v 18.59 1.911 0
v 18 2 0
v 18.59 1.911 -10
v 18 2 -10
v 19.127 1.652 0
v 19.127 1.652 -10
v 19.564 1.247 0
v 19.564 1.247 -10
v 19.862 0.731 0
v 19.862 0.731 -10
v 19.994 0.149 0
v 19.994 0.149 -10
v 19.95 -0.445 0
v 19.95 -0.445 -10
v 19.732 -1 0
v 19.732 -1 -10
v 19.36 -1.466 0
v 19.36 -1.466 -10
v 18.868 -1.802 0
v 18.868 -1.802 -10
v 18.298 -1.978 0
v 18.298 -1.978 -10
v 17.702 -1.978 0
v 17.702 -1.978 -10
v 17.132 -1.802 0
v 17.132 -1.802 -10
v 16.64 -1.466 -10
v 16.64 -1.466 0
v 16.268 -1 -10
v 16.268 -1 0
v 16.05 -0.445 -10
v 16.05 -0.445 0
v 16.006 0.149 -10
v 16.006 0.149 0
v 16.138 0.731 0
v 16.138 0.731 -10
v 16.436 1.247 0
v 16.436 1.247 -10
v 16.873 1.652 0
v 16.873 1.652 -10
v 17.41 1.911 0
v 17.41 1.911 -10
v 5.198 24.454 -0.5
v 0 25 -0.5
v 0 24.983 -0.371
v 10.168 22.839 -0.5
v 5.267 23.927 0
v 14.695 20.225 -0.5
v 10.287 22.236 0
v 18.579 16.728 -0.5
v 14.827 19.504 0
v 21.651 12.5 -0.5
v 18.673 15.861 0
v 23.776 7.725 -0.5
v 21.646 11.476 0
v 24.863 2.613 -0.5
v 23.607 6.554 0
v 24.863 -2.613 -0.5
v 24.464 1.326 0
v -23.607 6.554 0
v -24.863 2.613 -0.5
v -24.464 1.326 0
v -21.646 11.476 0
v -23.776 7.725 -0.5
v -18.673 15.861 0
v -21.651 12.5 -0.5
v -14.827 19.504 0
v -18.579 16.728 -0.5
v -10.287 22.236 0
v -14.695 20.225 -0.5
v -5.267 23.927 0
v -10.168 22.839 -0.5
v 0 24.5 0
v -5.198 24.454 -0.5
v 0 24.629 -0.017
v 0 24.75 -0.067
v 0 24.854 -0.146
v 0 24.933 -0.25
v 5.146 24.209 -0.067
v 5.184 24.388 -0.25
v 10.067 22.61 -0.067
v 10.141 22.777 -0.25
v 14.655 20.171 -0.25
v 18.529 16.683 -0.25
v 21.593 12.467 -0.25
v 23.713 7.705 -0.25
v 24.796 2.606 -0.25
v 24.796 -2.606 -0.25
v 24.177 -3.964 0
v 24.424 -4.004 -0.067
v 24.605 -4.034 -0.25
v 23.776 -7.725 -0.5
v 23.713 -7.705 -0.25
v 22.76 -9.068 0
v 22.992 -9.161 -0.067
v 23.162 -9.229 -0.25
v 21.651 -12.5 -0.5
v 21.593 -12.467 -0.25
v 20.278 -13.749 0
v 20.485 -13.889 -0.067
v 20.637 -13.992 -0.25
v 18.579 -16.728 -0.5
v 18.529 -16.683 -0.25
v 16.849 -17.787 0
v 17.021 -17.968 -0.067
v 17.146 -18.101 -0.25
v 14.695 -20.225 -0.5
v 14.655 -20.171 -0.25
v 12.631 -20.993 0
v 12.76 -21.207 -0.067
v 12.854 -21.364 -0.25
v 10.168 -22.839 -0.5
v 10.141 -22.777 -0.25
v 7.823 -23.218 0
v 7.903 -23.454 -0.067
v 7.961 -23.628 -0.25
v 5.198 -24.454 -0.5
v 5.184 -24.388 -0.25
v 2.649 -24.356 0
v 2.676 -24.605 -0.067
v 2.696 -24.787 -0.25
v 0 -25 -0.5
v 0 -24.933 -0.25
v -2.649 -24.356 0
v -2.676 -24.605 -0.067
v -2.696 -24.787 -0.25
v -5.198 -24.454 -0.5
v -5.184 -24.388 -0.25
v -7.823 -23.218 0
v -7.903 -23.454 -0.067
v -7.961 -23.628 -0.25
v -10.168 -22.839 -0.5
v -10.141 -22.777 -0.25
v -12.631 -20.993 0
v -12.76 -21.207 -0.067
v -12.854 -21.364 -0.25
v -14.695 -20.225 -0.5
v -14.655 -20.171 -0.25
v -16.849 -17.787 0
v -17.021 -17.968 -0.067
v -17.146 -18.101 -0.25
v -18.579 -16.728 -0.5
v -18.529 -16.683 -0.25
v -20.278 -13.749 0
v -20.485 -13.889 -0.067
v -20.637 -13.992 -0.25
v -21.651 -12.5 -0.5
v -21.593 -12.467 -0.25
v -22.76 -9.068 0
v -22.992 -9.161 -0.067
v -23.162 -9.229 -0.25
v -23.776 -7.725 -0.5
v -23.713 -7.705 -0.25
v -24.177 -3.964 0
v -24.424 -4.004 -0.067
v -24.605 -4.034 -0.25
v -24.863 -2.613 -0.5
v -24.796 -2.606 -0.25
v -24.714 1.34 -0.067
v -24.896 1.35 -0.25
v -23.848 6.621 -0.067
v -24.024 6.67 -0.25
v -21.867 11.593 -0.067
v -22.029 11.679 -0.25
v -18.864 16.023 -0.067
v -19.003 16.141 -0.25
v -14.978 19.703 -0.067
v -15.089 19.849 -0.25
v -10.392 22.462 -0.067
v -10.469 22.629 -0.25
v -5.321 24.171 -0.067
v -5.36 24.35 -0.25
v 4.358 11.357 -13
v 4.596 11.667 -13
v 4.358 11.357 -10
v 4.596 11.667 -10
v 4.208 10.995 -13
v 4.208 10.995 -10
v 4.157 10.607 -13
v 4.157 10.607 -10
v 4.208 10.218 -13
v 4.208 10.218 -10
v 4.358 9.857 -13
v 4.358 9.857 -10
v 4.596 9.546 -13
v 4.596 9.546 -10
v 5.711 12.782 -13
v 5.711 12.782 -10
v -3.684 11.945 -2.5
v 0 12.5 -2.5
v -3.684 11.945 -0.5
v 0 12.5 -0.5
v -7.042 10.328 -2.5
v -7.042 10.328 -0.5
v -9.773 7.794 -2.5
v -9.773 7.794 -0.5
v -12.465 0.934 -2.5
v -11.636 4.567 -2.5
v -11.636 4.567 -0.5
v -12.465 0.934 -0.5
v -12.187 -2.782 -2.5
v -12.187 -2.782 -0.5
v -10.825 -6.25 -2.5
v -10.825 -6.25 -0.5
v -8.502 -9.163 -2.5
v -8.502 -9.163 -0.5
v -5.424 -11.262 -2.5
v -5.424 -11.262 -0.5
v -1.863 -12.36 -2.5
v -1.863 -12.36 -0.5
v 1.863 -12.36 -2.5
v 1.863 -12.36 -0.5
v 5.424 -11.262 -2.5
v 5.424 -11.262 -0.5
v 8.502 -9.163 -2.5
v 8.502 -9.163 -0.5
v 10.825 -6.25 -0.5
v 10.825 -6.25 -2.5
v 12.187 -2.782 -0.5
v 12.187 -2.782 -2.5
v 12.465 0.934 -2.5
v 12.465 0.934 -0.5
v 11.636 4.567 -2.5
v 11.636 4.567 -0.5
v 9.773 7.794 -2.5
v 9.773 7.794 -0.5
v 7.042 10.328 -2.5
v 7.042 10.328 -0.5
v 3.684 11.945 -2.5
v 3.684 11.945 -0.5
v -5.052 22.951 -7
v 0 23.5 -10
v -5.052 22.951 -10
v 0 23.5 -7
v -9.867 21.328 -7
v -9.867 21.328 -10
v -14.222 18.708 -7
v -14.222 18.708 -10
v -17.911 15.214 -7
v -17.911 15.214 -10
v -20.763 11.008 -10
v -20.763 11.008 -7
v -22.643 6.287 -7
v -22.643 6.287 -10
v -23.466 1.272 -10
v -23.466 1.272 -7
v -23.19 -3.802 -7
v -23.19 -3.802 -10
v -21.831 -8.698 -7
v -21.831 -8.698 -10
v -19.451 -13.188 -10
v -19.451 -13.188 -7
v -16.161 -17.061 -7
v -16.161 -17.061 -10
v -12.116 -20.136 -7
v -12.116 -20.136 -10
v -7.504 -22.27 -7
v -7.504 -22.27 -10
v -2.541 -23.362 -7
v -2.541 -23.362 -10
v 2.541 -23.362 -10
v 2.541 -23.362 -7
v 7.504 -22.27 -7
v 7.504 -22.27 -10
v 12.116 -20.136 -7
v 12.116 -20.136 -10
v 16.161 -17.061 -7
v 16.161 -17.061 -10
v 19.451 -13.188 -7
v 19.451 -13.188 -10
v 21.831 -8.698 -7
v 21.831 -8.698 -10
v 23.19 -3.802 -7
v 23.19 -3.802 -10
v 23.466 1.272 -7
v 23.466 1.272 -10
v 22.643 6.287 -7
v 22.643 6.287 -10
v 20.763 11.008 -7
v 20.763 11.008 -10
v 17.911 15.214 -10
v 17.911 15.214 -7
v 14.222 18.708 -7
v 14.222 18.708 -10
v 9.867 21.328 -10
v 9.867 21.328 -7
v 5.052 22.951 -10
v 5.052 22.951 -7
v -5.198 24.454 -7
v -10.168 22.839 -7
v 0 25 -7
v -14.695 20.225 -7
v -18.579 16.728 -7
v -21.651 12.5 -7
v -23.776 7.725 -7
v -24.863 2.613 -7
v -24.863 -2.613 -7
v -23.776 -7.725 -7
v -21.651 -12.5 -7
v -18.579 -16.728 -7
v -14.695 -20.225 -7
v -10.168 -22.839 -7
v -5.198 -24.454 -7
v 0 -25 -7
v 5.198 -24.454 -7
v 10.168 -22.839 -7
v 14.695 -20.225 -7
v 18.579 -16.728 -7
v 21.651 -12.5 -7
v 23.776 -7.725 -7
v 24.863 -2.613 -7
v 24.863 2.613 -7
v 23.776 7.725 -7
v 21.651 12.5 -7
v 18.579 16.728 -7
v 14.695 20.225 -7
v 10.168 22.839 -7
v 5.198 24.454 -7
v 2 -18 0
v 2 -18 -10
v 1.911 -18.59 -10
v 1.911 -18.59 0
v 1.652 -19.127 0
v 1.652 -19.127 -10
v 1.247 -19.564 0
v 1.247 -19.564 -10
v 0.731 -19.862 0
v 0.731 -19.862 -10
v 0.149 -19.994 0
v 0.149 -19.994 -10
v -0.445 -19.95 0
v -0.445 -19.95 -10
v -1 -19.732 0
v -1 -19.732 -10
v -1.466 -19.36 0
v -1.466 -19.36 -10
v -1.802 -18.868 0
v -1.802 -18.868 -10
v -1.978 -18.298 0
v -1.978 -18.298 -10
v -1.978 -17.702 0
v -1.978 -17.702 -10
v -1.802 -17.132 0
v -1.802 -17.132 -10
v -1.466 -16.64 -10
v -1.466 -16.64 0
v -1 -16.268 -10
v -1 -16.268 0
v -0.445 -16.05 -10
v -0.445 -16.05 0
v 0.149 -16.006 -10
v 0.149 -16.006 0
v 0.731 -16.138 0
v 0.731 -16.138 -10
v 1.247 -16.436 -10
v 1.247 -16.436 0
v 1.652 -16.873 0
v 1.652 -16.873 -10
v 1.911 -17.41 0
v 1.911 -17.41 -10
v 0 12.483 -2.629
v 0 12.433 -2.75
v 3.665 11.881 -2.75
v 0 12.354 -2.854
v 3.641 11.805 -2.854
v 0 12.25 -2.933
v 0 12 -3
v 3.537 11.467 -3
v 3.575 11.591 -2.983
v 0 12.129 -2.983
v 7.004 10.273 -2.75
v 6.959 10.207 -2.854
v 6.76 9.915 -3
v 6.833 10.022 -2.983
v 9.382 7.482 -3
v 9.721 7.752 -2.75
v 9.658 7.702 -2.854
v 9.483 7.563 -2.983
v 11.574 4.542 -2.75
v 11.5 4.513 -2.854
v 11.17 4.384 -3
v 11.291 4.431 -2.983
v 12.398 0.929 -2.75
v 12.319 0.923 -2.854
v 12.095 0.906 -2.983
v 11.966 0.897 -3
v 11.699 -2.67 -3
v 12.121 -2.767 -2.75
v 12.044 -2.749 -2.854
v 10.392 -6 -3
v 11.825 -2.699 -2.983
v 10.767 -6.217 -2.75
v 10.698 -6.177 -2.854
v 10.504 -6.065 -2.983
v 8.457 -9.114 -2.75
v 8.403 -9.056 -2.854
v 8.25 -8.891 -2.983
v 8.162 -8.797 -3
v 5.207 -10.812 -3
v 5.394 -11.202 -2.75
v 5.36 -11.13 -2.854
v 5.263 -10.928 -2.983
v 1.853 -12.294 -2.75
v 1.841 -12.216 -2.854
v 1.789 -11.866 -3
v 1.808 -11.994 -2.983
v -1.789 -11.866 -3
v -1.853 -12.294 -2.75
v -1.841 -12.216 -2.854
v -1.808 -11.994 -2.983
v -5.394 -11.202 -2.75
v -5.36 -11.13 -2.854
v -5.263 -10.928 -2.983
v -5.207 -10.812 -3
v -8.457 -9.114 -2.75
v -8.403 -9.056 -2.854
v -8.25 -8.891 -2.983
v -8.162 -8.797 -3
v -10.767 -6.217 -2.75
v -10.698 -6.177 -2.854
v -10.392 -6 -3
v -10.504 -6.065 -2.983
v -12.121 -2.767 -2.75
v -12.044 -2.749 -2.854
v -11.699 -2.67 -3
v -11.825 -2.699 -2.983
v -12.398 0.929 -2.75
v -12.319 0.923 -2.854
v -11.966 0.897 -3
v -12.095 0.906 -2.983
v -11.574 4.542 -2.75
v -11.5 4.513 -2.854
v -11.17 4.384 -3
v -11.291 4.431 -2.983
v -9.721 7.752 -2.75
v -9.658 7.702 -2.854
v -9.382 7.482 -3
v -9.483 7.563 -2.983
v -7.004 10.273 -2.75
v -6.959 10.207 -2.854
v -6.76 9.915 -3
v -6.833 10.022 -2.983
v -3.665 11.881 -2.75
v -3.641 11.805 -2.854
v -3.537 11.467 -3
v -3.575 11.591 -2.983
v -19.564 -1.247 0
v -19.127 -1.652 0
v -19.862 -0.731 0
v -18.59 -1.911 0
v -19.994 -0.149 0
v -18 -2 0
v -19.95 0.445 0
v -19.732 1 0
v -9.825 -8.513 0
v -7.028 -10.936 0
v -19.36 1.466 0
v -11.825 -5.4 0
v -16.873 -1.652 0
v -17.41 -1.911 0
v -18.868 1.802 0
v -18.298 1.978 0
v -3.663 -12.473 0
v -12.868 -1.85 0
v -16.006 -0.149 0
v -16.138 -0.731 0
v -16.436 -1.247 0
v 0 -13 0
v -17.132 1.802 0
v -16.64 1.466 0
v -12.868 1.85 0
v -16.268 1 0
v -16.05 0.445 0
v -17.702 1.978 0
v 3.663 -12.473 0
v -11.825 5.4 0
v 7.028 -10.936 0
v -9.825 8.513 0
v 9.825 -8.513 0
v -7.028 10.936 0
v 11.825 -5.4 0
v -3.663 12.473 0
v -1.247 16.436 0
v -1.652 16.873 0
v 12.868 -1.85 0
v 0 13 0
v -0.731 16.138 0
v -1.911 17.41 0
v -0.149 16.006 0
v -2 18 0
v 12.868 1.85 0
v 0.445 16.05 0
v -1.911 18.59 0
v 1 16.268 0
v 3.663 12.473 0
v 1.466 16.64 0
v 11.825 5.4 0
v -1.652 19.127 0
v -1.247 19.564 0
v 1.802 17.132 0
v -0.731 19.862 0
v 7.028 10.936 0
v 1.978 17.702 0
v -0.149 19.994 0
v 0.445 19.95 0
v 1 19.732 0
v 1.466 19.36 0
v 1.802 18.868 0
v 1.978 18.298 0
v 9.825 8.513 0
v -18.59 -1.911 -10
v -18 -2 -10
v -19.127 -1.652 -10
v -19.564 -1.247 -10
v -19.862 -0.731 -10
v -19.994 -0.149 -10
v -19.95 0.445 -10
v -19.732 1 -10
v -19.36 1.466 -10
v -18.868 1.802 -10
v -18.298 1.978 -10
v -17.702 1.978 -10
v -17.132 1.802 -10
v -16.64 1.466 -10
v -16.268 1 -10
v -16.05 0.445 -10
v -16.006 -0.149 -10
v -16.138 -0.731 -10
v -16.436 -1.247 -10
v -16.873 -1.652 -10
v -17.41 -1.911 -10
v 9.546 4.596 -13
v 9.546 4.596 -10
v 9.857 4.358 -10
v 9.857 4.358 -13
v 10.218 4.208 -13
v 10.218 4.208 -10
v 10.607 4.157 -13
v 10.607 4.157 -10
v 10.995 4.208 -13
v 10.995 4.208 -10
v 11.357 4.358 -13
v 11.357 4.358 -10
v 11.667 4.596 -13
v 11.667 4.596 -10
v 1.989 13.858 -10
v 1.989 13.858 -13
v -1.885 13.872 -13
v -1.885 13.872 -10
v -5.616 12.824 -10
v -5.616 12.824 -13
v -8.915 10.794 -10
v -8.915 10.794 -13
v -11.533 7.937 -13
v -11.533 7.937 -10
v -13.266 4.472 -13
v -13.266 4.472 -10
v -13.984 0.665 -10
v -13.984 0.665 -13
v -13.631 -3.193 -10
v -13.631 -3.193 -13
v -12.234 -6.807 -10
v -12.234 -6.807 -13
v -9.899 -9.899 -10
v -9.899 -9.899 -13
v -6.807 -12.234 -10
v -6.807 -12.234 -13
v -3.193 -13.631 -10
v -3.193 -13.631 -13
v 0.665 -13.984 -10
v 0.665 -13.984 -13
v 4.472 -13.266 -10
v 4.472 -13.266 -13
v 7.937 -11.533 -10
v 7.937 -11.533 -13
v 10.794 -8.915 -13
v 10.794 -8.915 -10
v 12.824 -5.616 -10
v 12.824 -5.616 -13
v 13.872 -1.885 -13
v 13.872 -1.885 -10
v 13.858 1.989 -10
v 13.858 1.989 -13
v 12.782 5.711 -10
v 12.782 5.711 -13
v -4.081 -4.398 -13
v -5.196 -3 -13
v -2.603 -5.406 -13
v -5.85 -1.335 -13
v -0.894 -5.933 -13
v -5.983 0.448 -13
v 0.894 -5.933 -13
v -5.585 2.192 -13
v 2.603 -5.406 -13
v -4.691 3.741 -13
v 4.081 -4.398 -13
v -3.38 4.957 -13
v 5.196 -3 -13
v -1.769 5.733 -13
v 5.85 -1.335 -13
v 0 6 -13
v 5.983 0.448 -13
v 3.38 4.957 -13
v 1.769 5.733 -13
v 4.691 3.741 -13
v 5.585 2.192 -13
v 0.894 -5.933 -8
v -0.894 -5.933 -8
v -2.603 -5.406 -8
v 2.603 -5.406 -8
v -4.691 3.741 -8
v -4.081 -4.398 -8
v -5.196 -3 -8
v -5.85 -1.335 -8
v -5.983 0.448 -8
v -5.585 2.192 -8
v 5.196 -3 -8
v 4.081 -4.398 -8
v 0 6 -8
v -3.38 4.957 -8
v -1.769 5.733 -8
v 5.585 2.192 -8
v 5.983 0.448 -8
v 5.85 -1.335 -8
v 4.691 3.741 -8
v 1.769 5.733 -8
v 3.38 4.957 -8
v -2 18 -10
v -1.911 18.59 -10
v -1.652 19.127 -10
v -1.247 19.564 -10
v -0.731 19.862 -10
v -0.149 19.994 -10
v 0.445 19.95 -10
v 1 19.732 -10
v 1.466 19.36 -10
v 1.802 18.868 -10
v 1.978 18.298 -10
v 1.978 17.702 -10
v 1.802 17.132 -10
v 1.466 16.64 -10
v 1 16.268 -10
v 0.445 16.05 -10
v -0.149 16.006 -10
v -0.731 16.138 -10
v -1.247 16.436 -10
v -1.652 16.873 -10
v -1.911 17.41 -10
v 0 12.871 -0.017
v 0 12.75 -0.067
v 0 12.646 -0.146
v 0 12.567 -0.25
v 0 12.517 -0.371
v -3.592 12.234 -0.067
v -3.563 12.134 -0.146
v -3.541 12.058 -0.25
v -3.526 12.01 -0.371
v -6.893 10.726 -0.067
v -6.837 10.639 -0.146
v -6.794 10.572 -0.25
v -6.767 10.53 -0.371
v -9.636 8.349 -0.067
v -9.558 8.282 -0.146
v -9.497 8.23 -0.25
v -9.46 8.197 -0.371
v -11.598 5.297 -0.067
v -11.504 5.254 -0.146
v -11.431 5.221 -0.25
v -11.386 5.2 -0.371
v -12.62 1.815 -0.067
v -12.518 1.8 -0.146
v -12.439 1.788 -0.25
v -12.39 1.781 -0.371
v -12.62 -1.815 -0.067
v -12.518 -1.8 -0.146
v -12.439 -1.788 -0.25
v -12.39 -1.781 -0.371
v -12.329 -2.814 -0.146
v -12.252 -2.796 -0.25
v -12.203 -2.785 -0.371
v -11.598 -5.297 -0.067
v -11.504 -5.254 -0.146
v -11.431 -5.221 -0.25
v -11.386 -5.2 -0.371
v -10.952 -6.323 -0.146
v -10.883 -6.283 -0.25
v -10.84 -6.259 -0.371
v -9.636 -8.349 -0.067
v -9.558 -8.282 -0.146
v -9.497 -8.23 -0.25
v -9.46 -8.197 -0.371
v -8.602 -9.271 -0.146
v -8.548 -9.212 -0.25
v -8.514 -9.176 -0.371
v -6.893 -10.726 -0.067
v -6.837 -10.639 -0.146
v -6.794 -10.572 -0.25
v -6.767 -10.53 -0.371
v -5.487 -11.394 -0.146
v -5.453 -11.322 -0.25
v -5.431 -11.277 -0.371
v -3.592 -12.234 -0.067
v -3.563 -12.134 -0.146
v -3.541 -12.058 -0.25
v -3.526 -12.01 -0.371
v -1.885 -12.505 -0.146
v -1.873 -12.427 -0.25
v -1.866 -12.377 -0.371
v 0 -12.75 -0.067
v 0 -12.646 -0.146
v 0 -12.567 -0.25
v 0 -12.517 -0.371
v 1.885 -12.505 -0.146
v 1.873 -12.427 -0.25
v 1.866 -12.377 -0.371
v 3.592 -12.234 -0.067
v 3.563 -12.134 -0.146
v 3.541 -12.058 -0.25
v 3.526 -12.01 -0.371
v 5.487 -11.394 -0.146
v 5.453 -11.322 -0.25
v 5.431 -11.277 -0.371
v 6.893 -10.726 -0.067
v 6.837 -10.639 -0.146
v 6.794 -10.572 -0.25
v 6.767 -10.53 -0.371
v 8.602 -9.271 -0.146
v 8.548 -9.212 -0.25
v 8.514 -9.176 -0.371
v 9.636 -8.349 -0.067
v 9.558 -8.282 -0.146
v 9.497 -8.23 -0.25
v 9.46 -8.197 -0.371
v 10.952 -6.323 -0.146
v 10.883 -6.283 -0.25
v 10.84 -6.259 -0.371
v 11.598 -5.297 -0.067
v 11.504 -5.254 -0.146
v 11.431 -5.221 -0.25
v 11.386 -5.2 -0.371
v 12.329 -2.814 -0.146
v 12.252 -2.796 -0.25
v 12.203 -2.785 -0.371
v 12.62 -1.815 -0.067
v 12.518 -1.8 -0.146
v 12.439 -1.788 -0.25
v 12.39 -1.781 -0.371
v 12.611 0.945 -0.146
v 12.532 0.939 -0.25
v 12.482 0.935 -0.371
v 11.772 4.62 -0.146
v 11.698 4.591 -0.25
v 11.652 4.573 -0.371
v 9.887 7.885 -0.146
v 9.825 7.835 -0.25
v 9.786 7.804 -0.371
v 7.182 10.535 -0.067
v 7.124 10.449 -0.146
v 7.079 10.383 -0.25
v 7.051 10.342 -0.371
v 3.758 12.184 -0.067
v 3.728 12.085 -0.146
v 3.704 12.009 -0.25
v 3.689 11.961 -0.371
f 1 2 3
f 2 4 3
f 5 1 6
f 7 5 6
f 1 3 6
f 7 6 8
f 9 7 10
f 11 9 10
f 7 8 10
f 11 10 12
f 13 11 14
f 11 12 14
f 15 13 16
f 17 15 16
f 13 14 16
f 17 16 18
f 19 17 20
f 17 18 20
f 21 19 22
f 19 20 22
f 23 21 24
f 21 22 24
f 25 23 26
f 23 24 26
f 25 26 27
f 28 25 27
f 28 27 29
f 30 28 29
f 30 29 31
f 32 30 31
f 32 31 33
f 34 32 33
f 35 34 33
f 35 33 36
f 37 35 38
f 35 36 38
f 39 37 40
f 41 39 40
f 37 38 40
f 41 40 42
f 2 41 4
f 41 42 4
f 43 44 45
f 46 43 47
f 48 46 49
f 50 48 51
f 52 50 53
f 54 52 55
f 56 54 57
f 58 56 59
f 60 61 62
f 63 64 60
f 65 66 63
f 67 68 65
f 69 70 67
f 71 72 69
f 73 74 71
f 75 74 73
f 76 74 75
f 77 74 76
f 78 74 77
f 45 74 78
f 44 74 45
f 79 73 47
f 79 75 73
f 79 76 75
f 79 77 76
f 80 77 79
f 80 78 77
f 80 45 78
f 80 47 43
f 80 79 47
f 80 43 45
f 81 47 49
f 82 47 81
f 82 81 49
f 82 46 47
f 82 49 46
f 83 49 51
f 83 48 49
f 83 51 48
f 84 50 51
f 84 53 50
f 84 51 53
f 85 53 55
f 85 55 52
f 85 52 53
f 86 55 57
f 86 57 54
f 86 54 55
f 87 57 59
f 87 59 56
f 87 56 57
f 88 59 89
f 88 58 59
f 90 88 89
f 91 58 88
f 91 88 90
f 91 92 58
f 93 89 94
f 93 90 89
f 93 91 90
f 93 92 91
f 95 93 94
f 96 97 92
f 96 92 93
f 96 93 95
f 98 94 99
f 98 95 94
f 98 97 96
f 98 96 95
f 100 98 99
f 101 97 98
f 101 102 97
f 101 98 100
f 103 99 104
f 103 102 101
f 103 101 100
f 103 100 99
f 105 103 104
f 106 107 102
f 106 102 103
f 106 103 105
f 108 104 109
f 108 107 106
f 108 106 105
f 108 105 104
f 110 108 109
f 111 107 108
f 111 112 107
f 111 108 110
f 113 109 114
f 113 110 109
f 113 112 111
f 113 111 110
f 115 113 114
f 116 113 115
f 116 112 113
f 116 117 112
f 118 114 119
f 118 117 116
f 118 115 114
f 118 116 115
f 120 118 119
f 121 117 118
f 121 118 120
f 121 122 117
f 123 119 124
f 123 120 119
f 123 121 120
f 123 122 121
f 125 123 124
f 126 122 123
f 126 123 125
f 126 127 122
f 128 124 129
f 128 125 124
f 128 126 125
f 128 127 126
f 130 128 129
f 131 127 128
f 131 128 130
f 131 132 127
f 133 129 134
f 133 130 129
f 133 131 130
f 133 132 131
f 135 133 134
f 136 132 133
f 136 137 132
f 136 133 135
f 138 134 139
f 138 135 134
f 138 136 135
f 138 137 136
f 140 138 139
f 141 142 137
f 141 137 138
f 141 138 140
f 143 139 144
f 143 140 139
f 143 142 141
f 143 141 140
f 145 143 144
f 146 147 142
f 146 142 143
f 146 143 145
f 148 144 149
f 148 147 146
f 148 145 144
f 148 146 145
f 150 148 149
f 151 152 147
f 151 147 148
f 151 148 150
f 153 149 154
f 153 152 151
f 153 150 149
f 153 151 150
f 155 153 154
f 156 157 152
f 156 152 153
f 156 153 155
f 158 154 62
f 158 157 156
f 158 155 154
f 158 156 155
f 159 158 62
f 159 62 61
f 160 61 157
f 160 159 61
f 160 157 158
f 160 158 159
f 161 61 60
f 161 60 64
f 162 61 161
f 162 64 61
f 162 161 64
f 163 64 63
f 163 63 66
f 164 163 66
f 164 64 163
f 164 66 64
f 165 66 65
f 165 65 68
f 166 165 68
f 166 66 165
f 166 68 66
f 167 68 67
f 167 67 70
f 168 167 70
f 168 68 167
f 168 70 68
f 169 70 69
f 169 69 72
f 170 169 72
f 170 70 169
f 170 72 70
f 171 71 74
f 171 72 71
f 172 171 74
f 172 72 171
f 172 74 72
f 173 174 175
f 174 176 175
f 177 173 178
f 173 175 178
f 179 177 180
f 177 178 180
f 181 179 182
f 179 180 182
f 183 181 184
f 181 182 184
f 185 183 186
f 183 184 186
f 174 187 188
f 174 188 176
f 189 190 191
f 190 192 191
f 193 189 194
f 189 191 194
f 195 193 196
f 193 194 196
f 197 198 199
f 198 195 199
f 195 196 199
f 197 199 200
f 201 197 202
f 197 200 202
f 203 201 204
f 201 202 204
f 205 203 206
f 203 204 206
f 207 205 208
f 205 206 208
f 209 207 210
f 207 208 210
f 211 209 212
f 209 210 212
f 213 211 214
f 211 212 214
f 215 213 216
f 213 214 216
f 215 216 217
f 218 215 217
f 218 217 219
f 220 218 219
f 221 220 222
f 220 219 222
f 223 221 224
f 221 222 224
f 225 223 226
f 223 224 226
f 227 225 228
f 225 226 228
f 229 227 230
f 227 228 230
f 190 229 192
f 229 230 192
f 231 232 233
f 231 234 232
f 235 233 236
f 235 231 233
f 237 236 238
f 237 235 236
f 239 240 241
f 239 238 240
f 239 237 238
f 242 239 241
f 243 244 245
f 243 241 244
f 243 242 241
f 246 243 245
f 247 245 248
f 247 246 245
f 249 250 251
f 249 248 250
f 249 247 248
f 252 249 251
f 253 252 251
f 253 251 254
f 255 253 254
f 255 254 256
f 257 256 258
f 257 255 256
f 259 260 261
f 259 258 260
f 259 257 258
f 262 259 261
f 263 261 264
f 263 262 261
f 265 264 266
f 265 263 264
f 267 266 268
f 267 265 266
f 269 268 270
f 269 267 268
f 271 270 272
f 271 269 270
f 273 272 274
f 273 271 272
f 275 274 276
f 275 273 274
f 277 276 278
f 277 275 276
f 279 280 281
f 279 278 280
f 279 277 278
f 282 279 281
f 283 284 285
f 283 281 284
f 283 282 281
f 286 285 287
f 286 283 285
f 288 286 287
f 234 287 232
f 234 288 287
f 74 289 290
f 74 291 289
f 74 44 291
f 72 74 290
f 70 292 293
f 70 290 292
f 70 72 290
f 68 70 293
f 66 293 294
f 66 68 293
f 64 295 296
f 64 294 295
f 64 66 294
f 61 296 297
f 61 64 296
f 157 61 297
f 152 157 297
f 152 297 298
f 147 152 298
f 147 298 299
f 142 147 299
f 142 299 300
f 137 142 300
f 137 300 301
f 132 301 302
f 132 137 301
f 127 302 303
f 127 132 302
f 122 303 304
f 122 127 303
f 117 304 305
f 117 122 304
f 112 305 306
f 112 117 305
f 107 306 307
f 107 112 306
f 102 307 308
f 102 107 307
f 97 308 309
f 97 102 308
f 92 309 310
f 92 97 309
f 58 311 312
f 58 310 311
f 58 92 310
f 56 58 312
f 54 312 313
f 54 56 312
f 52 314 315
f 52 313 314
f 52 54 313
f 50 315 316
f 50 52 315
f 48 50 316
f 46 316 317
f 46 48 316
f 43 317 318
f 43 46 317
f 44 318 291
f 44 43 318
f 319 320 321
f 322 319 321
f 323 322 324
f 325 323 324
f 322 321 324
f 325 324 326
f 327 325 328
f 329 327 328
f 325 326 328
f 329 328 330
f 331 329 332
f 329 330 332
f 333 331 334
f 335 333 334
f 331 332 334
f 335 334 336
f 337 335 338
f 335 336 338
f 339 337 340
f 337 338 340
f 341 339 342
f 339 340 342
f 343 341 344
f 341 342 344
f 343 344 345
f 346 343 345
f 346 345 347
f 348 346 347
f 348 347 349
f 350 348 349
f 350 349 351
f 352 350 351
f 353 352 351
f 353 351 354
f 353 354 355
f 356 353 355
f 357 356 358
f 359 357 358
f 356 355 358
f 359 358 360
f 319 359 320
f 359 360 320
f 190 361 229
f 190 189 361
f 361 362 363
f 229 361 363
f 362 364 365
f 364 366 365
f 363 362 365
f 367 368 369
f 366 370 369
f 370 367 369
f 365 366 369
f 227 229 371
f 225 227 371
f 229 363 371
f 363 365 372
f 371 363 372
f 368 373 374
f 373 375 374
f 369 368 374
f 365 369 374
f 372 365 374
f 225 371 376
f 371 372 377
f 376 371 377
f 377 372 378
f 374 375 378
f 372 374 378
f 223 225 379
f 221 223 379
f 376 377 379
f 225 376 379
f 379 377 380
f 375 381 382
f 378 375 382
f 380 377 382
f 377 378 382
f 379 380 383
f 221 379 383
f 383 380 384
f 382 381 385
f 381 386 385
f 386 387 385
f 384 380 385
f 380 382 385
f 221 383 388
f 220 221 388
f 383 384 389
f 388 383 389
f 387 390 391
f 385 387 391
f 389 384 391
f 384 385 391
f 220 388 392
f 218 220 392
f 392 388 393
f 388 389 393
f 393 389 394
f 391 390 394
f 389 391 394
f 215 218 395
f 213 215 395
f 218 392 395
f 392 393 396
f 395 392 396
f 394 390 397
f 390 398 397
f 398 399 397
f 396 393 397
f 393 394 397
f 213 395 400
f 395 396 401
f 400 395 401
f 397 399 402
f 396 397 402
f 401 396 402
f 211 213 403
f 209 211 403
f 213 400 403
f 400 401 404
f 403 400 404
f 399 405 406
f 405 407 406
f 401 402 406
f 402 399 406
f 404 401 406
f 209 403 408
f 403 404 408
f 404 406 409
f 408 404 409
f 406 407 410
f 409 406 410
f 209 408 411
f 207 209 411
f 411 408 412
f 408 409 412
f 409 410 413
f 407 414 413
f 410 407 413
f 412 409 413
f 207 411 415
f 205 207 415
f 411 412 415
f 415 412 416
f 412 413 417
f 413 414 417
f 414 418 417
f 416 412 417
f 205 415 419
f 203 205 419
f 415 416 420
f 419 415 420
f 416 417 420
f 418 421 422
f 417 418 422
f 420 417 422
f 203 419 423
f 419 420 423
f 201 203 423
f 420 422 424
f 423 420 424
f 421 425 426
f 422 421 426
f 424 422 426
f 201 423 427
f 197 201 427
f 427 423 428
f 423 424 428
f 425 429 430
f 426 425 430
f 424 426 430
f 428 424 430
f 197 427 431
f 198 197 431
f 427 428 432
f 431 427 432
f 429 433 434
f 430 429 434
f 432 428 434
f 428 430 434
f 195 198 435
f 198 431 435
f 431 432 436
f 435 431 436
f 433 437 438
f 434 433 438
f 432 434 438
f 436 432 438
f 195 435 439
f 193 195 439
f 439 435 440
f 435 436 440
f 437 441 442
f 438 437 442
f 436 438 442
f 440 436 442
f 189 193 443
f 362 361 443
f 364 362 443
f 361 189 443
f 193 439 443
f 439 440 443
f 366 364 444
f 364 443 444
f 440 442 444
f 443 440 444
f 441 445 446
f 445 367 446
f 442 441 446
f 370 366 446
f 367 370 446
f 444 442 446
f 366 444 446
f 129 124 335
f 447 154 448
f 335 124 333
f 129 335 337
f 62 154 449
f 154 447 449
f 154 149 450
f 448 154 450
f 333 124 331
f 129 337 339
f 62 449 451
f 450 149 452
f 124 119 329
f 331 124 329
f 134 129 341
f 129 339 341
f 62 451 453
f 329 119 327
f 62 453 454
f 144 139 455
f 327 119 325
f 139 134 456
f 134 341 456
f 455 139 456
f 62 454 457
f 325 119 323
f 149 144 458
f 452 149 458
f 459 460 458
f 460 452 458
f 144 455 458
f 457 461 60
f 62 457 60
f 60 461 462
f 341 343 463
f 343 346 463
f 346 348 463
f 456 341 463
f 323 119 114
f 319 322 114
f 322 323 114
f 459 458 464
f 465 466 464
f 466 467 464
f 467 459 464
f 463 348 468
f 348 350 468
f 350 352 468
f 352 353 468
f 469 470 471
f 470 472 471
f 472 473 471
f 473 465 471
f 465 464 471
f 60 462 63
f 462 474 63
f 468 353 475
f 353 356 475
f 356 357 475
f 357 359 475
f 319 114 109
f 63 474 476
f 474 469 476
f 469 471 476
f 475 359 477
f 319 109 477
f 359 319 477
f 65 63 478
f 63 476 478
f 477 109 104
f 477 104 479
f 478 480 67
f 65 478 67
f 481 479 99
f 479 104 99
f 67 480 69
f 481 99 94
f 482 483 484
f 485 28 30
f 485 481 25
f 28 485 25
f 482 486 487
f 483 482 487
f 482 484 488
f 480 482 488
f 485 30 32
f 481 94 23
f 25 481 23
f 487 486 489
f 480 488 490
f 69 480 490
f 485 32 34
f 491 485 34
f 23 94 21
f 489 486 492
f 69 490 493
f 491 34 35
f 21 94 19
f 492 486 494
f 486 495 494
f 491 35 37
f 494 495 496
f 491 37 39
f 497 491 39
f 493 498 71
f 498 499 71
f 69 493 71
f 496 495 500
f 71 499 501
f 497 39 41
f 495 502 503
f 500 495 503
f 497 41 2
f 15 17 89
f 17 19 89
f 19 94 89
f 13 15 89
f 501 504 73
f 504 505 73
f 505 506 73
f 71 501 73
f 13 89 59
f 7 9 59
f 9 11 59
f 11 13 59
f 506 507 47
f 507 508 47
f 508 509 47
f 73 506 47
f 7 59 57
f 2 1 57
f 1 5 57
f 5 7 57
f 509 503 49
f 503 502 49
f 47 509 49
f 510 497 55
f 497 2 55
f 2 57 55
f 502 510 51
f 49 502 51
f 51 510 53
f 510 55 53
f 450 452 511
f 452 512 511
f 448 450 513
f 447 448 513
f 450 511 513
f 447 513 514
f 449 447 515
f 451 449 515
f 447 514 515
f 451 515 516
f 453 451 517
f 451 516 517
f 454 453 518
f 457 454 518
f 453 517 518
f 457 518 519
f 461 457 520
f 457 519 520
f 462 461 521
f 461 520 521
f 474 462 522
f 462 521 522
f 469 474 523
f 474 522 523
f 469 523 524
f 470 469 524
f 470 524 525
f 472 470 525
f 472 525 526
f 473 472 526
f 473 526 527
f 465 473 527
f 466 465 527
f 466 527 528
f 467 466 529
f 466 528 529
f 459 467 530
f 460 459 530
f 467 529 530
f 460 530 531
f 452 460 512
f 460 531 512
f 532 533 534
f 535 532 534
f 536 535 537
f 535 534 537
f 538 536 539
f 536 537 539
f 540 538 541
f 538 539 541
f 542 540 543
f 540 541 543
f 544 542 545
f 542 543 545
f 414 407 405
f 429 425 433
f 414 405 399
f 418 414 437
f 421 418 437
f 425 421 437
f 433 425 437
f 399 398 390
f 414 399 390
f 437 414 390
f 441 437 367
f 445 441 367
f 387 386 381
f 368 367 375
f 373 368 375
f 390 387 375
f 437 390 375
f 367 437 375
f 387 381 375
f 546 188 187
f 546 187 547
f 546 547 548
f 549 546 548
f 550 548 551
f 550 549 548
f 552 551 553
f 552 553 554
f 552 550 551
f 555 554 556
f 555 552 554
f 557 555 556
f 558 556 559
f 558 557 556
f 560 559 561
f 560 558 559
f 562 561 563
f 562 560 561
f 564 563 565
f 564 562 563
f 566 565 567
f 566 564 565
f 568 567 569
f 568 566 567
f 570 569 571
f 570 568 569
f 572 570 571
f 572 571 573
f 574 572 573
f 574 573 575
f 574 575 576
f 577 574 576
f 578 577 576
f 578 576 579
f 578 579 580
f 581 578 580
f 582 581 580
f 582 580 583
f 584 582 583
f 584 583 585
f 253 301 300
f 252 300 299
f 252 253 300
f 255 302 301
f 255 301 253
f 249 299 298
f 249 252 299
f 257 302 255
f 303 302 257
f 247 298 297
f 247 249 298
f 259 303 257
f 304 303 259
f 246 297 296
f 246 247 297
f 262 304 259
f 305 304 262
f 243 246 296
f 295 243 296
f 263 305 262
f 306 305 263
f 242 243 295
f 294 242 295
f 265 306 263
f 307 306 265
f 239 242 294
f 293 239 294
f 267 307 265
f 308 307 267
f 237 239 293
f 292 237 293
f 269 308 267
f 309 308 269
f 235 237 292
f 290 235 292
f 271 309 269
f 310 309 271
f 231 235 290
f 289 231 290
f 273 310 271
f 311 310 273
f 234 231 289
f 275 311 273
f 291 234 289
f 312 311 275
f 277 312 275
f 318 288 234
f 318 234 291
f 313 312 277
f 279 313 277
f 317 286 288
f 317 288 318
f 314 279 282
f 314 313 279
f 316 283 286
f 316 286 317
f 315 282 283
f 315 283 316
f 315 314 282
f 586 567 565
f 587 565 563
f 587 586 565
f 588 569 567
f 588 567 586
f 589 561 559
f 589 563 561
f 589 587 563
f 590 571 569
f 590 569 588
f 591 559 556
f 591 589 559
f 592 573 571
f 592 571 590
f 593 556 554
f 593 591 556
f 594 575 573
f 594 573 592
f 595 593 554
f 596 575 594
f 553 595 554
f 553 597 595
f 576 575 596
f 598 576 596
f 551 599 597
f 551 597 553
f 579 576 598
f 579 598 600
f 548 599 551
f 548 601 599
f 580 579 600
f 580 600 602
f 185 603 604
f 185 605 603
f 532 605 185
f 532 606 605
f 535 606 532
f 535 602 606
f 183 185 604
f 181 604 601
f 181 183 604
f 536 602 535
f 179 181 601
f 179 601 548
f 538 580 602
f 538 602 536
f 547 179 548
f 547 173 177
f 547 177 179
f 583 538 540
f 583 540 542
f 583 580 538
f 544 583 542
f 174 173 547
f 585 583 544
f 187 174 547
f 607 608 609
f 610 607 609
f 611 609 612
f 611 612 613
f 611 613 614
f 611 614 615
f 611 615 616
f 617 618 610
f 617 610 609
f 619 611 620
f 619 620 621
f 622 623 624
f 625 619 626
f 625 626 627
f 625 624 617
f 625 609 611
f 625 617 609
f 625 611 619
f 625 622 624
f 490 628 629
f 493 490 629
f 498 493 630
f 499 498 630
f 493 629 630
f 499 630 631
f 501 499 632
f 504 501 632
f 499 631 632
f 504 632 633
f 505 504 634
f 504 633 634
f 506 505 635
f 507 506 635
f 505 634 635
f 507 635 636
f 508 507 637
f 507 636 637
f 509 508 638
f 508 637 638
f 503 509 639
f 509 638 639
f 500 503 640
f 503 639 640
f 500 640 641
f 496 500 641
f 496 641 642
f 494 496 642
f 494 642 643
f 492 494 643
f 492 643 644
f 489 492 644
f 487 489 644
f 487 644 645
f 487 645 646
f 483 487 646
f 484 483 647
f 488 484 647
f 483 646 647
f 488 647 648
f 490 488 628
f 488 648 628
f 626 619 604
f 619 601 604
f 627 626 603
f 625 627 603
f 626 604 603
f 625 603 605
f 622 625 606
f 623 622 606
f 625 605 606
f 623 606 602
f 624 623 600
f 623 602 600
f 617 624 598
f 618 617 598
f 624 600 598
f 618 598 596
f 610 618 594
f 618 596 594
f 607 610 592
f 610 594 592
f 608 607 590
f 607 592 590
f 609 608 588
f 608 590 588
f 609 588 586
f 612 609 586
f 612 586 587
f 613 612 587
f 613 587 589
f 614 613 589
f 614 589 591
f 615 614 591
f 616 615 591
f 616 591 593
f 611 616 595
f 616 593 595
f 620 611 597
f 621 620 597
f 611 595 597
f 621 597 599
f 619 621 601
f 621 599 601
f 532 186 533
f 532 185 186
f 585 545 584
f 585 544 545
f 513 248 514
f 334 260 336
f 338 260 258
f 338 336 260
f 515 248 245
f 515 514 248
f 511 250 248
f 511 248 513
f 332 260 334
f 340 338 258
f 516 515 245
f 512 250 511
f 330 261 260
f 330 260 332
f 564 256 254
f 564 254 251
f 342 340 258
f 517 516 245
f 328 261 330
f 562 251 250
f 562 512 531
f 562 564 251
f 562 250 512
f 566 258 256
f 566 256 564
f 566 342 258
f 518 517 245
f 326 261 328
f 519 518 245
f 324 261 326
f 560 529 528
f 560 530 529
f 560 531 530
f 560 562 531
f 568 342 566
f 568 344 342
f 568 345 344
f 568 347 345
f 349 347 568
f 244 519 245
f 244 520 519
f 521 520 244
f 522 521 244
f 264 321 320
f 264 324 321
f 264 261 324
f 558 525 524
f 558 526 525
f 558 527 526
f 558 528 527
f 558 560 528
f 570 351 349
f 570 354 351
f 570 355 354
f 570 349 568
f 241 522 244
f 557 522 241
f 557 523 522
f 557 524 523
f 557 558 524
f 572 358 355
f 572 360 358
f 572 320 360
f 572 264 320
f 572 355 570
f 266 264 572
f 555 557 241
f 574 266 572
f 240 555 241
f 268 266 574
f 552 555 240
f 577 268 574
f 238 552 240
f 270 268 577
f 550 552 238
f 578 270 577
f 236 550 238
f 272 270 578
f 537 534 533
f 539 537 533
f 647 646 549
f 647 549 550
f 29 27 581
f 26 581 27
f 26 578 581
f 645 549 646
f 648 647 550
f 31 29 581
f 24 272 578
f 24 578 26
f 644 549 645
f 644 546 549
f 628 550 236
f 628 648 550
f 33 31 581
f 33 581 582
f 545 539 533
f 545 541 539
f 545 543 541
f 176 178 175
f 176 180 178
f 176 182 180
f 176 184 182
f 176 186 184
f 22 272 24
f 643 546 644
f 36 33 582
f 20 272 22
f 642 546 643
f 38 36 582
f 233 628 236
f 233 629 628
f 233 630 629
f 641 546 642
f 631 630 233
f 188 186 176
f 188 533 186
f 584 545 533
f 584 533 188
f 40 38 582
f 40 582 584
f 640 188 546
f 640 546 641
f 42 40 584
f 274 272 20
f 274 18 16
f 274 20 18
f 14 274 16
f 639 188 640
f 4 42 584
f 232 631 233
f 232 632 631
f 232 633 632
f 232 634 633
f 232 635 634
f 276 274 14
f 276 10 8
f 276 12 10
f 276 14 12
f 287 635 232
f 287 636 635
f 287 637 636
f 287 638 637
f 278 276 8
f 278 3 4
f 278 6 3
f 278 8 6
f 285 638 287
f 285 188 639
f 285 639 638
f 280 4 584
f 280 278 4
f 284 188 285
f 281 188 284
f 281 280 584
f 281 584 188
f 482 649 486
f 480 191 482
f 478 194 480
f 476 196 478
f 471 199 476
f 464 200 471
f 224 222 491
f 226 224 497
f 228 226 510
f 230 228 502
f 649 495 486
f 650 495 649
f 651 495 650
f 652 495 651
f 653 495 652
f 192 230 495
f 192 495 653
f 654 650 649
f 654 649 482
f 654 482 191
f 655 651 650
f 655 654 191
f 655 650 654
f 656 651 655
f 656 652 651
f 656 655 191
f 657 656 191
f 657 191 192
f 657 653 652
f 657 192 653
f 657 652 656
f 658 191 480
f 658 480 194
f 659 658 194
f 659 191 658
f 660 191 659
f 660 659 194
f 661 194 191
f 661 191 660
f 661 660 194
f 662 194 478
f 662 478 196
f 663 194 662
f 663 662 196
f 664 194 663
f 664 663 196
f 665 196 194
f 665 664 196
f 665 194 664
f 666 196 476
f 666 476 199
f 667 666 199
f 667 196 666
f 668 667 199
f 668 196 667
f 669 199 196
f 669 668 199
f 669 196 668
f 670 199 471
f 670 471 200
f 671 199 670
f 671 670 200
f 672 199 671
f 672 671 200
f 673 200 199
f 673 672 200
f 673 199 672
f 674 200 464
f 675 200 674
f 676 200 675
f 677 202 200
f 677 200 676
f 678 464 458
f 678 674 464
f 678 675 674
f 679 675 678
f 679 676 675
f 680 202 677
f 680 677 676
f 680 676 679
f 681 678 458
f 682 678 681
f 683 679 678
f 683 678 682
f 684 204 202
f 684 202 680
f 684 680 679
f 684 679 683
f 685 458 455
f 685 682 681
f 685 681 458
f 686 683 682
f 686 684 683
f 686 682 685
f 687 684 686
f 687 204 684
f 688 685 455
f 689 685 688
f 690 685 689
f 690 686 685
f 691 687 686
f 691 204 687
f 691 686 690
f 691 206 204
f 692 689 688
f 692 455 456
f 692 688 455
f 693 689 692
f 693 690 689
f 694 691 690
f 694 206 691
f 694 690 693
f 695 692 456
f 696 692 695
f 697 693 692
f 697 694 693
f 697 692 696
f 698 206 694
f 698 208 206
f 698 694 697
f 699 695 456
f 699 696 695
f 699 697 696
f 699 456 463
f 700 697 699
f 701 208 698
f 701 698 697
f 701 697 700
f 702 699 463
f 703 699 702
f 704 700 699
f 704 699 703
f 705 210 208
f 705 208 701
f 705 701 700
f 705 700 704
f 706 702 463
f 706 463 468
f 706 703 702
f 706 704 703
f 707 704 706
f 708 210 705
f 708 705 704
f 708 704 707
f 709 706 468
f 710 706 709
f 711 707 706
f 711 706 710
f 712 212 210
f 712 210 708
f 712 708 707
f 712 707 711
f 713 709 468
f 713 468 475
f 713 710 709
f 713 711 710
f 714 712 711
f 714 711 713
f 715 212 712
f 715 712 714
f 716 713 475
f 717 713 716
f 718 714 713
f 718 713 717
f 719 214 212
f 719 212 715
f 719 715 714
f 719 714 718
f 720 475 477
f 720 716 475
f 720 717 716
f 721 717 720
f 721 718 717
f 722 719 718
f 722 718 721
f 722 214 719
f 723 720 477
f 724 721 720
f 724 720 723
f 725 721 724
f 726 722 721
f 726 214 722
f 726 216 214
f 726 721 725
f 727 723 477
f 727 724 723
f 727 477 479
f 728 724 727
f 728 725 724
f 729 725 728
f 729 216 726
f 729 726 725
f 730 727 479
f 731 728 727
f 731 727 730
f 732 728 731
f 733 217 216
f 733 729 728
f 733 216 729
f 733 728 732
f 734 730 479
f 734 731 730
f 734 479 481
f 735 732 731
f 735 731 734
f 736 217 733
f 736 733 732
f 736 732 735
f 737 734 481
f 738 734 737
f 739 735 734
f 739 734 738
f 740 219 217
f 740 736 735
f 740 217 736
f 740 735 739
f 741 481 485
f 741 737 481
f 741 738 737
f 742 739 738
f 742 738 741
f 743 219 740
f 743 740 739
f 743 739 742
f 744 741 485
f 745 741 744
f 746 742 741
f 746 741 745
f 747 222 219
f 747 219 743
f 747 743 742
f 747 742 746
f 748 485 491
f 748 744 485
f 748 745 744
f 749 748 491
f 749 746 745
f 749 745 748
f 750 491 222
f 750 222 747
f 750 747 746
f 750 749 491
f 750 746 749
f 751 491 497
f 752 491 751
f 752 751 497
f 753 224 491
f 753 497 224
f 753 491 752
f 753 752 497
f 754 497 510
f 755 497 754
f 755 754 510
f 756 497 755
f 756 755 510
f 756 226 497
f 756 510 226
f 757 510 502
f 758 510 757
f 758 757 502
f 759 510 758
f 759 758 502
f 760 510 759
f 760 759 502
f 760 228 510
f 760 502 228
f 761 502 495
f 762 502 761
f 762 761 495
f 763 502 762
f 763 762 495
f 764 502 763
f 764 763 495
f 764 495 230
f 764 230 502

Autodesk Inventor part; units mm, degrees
ref_plane "YZ Plane" through (0, 0, 0) normal (1, 0, 0) x (0, 1, 0)
ref_plane "XZ Plane" through (0, 0, 0) normal (0, 1, 0) x (-1, 0, 0)
ref_plane "XY Plane" through (0, 0, 0) normal (0, 0, 1) x (1, 0, 0)
sketch "Skizze1" plane through (0, 0, 0) normal (1, 0, 0) x (0, 1, 0)
  line L0 (12.5, 3) -> (12.5, -3) construction
  line L1 (-12.5, -3) -> (-12.5, 3) construction
  line L2 (6, 26.2642) -> (6, -26.2642) construction
  line L3 (-6, -26.2642) -> (-6, 26.2642) construction
  line L4 (14, 26.2642) -> (14, -26.2642) construction
  line L5 (-14, -26.2642) -> (-14, 26.2642) construction
  line L6 (23.5, 26.2642) -> (23.5, -26.2642) construction
  line L7 (-23.5, -26.2642) -> (-23.5, 26.2642) construction
  line L8 (12.5, -3) -> (0, -3)
  line L9 (0, -3) -> (0, -8)
  line L10 (0, -8) -> (6, -8)
  line L11 (6, -8) -> (6, -13)
  line L12 (6, -13) -> (14, -13)
  line L13 (14, -13) -> (14, -10)
  line L14 (25, 26.2642) -> (25, -26.2642) construction
  line L15 (-25, -26.2642) -> (-25, 26.2642) construction
  line L16 (14, -10) -> (23.5, -10)
  line L17 (23.5, -10) -> (23.5, -7)
  line L18 (23.5, -7) -> (25, -7)
  line L19 (25, -7) -> (25, 0)
  line L20 (12.5, -3) -> (12.5, 0)
  line L21 (25, 0) -> (12.5, 0)
  point P0 (0, 0)
  dimension "d1" = 6
  dimension "d5" = 5
  dimension "d6" = 6
  dimension "d7" = 5
  dimension "d8" = 3
  dimension "d9" = 47
  dimension "d10" = 50
  dimension "d11" = 3
revolve "Umdrehung1" add sketch "Skizze1" angle 360 about axis through (0, 0, -3) along (0, 0, -1)
sketch "Skizze2" plane through (0, 0, -10) normal (0, 0, -1) x (-1, 0, 0)
  circle A0 centre (0, 0) radius 18 construction
  circle A1 centre (0, 18) radius 2
  dimension "d13" = 36
  dimension "d14" = 4
extrude "Extrusion1" cut sketch "Skizze2" against normal up to surface (10 mm away)
pattern_circular "Runde Anordnung1" count 4 over 360 about axis through (0, 0, -10.5) along (0, 0, -1) of "Extrusion1"
sketch "Skizze3" plane through (0, 0, -13) normal (0, 0, -1) x (-1, 0, 0)
  line L0 (0, 0) -> (-21.5822, 21.5822) construction
  line L1 (0, 0) -> (30.5219, 0) construction
  line L2 (-16.2635, 9.1924) -> (-9.1924, 16.2635)
  line L3 (-9.1924, 16.2635) -> (-3.5355, 10.6066)
  line L4 (-3.5355, 10.6066) -> (-10.6066, 3.5355)
  line L5 (-10.6066, 3.5355) -> (-16.2635, 9.1924)
  circle A0 centre (0, 0) radius 14 projected
  line L6 (-16.2635, 9.1924) -> (-3.5355, 10.6066) construction
  line L7 (-9.1924, 16.2635) -> (-10.6066, 3.5355) construction
  point P0 (-9.8995, 9.8995)
  point P1 (-5.7111, 12.7822)
  point P2 (-12.7822, 5.7111)
  dimension "d20" = 135
  dimension "d21" = 10
  dimension "d22" = 8
extrude "Extrusion2" cut sketch "Skizze3" against normal up to surface (3 mm away) contours A0 L3 L4 L5 picked at (-7.5887, 8.3902)
fillet "Rundung1" radius 1.5 2 edges at (3.5355, 10.6066, -11.5) (10.6066, 3.5355, -11.5)
fillet "Rundung2" radius 0.5 3 edges at (0, -12.5, 0) (0, -12.5, -3) (0, -25, 0)
properties part number "sf_Cylinder_Front_Lid_1"
